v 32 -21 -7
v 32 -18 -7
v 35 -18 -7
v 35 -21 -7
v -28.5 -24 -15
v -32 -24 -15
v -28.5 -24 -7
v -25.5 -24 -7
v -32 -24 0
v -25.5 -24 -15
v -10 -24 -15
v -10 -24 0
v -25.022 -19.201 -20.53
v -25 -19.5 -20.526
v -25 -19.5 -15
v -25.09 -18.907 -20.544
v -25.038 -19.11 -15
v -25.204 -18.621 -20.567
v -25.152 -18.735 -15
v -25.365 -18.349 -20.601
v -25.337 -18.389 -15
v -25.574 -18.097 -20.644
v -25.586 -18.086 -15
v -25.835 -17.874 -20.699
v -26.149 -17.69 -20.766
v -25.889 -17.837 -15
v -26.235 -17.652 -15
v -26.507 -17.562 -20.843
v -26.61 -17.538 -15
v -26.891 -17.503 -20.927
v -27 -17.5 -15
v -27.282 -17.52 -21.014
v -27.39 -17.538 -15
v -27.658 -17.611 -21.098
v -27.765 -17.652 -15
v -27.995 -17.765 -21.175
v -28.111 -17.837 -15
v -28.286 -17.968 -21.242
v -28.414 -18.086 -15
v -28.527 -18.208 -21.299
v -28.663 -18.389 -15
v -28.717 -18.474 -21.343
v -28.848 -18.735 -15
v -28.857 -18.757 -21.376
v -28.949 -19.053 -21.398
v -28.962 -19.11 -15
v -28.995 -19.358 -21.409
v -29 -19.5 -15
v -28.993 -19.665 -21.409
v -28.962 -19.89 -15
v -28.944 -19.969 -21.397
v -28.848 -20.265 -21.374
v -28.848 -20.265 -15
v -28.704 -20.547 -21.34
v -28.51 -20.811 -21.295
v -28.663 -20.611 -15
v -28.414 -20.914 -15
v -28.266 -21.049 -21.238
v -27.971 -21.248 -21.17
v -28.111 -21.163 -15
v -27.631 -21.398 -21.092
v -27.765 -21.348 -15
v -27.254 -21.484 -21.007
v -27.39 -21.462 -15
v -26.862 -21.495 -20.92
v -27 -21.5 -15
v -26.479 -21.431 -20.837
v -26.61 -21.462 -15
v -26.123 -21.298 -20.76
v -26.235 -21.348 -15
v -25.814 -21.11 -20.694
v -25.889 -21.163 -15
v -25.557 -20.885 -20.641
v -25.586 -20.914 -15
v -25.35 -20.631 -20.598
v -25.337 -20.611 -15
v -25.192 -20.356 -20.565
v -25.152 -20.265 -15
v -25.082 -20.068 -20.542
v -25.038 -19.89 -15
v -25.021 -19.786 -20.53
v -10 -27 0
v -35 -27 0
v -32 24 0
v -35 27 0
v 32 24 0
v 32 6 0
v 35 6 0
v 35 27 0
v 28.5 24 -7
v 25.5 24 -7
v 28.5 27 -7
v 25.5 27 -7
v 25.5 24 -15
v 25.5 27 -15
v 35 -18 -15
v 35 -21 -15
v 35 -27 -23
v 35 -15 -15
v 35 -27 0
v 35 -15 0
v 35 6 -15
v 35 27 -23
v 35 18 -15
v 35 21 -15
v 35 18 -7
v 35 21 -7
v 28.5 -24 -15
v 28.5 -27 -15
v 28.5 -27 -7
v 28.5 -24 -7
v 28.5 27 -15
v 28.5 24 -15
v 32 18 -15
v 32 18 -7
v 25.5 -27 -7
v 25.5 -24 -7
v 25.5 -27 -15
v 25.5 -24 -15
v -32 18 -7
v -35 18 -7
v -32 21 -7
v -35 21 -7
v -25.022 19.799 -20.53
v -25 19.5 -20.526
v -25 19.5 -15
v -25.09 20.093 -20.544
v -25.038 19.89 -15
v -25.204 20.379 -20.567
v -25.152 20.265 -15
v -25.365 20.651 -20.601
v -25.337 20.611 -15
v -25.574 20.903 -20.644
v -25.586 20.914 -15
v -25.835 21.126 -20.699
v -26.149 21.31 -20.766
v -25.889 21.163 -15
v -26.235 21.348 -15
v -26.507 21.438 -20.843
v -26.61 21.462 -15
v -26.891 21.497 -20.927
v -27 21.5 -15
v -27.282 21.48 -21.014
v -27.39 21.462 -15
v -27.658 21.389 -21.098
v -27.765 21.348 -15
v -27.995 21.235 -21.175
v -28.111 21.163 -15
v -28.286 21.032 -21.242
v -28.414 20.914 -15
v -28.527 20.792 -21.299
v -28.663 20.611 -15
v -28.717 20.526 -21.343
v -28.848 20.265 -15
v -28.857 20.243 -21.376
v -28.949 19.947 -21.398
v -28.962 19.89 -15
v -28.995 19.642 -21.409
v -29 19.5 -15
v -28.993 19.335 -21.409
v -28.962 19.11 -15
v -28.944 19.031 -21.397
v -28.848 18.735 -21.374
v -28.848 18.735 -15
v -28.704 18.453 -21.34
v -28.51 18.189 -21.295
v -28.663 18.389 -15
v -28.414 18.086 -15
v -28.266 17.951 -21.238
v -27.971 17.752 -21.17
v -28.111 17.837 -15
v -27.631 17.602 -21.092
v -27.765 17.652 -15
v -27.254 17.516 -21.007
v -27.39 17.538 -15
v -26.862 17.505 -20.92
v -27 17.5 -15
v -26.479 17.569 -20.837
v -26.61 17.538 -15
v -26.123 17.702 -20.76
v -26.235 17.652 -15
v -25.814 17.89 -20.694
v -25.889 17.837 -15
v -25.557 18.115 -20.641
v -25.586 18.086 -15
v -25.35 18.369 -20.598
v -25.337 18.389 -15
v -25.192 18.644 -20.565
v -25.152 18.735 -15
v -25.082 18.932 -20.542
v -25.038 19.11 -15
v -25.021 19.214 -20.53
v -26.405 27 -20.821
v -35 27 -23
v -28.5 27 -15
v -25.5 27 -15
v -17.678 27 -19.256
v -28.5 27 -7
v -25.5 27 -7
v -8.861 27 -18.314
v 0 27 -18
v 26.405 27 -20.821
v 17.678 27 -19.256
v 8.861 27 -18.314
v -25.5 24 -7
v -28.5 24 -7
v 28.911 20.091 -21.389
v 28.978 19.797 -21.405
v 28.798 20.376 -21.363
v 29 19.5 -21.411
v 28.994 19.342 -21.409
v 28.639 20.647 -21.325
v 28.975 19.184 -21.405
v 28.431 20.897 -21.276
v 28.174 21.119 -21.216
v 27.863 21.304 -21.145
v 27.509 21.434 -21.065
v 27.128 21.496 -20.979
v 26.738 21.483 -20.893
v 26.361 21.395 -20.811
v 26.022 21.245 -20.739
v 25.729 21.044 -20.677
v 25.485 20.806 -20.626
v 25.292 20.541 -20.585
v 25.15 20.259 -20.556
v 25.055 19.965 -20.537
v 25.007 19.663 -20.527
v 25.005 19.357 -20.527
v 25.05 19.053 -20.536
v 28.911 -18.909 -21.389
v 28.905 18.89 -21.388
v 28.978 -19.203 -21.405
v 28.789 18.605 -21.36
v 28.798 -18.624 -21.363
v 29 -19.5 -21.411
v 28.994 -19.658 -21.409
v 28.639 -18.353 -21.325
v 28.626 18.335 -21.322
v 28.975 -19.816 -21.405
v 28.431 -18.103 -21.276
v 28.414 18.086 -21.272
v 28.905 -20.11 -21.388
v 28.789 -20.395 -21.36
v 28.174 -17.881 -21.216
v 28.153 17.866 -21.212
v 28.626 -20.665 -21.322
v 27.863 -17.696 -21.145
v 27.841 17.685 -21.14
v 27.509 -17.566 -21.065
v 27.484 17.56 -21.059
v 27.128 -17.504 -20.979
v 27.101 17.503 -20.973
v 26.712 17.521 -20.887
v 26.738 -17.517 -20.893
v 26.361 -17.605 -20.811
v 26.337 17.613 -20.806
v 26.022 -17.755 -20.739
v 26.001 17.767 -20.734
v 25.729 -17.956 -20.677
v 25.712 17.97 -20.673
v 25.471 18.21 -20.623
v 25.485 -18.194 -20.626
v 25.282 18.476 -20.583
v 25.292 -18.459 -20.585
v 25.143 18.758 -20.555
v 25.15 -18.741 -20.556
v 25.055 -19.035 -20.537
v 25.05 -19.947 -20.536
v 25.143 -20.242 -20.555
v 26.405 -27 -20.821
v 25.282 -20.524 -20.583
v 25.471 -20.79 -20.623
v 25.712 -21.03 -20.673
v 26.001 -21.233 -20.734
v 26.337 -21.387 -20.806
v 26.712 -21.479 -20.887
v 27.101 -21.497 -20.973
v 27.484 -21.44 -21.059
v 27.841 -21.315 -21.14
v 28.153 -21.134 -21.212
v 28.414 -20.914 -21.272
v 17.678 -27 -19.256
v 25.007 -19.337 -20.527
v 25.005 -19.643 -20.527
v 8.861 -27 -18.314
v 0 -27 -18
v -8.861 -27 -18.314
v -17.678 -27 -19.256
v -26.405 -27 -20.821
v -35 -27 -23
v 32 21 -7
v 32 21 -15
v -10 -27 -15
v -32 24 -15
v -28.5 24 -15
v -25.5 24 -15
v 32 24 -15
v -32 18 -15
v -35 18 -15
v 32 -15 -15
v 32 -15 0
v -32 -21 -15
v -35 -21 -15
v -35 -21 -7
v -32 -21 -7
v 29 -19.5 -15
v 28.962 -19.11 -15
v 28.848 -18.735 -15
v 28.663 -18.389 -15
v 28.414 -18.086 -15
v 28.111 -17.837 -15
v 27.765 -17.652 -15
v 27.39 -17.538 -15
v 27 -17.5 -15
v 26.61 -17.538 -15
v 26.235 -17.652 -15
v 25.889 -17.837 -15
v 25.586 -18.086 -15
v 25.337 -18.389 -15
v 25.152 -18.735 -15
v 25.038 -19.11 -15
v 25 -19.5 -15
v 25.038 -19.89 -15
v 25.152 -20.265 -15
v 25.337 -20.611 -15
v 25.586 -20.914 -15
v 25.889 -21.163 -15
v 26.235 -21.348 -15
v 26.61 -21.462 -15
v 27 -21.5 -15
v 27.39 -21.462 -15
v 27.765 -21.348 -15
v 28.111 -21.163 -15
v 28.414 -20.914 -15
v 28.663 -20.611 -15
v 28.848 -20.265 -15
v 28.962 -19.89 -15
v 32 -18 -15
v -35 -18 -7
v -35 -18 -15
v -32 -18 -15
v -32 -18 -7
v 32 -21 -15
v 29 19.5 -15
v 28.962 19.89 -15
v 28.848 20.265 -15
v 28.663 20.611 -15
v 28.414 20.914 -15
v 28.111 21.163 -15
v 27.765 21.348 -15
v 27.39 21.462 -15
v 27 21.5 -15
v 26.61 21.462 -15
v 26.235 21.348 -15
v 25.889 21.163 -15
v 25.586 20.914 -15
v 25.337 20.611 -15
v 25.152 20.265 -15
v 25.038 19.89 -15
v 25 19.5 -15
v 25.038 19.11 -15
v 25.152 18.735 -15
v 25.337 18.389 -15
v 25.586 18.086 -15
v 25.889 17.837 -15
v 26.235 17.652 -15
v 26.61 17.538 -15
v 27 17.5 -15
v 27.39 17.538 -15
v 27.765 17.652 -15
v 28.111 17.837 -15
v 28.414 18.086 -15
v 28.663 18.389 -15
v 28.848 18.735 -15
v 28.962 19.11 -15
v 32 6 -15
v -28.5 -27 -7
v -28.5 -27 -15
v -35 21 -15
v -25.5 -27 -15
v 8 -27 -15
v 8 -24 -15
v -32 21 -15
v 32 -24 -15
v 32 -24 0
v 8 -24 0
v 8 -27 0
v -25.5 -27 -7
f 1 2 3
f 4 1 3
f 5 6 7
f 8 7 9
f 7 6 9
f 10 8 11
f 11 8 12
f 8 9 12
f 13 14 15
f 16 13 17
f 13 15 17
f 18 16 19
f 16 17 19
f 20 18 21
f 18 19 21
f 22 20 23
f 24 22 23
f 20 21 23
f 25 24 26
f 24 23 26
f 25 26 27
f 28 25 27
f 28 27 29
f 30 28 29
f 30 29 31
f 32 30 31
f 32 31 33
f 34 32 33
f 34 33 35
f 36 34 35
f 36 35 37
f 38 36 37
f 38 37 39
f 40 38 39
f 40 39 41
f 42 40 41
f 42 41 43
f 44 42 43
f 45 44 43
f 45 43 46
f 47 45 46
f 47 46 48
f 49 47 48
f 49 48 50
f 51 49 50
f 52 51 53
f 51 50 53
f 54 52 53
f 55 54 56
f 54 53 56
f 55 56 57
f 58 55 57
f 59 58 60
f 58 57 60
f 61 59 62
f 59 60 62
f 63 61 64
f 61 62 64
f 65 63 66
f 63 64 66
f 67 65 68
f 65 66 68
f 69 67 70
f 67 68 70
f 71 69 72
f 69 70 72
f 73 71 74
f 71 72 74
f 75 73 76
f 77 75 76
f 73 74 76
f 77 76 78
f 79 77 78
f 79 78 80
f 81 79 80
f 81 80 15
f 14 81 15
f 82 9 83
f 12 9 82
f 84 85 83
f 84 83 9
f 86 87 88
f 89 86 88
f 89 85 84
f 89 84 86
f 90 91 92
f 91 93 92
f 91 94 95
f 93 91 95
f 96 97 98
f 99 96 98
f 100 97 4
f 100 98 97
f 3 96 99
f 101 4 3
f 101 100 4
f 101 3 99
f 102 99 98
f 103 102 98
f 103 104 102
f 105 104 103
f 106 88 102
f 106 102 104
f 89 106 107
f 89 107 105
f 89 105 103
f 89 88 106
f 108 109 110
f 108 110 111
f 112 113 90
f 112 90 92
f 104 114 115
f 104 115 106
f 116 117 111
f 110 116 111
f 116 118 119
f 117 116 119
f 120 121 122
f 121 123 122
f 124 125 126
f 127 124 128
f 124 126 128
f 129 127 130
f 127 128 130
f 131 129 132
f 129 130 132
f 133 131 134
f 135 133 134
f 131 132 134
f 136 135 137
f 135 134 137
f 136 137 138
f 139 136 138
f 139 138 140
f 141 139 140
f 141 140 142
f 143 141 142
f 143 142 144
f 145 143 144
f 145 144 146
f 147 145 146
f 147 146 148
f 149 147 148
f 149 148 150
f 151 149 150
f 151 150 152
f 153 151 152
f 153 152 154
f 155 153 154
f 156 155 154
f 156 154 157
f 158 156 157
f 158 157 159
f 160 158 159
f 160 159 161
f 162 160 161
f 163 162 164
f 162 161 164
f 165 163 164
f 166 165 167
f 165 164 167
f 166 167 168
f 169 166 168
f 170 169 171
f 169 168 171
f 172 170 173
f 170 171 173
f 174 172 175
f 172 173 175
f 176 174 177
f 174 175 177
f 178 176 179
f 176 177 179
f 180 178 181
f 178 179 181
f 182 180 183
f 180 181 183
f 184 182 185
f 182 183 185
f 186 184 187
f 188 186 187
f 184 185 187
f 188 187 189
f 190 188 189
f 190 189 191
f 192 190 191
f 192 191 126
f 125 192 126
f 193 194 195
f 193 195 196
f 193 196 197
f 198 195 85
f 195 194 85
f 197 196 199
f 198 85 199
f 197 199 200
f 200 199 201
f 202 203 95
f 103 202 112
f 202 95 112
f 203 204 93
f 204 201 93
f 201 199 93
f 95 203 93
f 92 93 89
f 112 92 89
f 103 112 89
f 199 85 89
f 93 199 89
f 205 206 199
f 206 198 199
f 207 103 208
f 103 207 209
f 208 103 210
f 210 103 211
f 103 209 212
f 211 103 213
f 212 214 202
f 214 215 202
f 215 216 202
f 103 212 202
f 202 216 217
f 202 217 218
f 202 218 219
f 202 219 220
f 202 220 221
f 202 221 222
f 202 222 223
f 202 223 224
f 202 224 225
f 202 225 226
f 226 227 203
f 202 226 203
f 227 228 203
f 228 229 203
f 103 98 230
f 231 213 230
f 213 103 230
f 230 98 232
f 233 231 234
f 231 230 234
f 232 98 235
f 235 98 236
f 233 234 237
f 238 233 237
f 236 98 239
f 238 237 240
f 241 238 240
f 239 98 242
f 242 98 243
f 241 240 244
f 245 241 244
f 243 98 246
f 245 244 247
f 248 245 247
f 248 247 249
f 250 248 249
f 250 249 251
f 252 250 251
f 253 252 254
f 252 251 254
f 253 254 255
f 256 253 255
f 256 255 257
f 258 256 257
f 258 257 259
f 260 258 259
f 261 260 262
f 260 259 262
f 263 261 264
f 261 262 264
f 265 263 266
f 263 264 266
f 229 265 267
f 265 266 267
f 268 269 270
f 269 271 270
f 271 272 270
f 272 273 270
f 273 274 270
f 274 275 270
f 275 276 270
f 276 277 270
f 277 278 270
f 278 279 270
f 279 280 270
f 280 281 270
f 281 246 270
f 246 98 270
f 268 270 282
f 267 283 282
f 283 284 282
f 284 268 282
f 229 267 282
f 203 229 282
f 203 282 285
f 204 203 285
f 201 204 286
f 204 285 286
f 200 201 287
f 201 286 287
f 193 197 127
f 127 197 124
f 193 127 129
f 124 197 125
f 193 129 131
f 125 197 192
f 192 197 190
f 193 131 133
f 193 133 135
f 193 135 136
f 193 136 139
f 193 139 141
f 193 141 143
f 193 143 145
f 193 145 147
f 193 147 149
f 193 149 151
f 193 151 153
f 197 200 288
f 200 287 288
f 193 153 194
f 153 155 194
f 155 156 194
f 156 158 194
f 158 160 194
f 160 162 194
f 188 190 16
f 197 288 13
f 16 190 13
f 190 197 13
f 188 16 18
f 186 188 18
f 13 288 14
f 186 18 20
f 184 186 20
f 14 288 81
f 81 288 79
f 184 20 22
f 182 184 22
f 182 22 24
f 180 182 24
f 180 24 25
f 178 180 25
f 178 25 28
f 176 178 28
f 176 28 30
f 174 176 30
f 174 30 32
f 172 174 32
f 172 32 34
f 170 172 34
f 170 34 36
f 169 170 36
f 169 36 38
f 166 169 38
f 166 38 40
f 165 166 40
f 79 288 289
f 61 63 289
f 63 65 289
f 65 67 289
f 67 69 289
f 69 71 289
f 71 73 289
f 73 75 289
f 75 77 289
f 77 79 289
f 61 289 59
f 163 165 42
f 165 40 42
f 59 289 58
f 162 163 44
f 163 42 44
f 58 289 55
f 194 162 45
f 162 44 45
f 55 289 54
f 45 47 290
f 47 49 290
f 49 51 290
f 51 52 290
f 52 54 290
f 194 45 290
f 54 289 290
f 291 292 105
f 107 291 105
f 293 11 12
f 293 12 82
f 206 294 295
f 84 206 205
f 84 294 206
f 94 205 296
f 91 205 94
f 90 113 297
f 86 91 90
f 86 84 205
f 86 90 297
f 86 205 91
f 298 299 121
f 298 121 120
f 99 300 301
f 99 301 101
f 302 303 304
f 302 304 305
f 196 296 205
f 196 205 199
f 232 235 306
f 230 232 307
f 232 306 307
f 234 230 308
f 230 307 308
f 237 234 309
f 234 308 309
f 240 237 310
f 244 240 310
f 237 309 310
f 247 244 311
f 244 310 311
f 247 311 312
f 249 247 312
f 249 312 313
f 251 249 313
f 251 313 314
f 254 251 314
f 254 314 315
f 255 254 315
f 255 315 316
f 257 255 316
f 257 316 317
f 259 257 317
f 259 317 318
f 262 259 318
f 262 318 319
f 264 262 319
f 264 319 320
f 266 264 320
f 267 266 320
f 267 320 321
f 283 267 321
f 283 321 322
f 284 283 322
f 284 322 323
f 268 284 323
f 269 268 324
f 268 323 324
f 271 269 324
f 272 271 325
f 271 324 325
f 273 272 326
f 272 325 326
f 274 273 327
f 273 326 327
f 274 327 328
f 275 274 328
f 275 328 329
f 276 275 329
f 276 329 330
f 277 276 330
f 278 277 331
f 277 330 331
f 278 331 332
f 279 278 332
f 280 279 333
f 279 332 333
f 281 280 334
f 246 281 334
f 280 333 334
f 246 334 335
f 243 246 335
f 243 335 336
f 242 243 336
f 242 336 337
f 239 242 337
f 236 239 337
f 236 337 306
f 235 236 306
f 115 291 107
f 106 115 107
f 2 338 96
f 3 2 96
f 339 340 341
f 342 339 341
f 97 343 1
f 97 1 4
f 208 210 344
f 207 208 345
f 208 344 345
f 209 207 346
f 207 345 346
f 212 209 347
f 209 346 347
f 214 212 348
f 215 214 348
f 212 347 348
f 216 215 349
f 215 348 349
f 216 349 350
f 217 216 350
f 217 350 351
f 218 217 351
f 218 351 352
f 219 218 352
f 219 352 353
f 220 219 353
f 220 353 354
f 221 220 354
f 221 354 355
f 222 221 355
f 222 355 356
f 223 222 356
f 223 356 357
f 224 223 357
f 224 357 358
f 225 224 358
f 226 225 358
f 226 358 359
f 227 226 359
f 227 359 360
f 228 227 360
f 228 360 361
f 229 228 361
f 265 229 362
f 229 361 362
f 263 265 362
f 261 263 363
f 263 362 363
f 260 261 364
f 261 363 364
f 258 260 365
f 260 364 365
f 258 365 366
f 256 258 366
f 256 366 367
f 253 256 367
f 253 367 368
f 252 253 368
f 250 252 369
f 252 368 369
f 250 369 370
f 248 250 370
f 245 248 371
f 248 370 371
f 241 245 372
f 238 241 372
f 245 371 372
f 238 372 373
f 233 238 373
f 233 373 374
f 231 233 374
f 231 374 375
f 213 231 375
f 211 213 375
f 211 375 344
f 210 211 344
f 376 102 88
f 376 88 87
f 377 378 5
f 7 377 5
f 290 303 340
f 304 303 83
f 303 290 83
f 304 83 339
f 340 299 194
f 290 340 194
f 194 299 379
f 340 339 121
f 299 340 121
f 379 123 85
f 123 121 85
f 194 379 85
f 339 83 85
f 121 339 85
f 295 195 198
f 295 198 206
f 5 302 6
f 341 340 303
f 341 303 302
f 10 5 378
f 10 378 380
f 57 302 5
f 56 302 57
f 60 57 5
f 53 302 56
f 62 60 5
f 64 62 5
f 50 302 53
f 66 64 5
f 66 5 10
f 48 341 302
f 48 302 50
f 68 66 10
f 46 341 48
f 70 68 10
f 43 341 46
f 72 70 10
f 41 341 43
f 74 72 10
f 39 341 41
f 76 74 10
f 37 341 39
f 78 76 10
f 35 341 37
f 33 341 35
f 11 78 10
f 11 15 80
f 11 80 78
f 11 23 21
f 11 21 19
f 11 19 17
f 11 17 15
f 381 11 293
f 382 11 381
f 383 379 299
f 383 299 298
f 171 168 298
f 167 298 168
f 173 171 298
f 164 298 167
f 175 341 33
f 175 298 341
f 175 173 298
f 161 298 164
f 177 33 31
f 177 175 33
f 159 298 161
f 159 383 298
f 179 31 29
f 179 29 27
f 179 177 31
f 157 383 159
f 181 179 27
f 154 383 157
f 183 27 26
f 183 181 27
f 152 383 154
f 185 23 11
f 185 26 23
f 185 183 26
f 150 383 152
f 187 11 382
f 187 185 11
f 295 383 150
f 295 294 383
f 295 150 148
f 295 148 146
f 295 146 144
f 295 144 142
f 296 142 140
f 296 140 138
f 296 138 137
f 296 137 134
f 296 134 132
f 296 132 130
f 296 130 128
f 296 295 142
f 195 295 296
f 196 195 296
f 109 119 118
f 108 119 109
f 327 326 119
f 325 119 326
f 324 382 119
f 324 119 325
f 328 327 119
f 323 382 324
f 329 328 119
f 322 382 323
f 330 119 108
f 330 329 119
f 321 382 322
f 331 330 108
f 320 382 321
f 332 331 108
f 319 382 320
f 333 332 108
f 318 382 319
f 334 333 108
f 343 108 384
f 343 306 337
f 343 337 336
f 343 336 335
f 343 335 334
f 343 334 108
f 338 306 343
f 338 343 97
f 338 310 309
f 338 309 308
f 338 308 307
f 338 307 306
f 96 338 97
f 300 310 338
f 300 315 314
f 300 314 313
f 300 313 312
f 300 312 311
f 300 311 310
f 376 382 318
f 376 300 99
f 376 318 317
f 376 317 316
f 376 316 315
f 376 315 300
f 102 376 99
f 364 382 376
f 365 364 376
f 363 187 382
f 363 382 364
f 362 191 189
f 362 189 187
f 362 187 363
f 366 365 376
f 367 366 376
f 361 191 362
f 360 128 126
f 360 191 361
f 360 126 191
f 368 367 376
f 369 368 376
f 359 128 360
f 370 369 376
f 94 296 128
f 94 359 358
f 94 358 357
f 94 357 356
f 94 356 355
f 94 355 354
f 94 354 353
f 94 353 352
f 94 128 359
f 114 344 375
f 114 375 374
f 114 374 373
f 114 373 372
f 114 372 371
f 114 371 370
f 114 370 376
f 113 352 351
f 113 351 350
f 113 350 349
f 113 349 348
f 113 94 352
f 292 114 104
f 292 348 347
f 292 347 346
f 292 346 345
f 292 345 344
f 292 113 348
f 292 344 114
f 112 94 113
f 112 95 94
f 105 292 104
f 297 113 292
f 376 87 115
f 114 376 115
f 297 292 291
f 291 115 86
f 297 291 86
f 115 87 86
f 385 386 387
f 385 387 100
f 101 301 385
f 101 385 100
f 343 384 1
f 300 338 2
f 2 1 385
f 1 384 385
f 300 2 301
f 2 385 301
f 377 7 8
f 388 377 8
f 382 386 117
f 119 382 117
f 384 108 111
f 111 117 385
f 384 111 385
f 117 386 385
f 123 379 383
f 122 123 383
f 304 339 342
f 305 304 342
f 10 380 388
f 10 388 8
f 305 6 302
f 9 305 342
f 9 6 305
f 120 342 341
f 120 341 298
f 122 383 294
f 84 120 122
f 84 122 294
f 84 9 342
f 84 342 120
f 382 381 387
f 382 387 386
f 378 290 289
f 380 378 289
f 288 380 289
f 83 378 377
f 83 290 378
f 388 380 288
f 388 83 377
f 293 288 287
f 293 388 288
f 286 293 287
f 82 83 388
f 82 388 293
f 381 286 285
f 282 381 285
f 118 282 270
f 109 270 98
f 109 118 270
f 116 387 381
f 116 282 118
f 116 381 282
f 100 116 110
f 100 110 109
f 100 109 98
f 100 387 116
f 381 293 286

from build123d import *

# Parameters (mm, degrees)
F0_W      = 70
F0_H      = 54
F1_DEPTH  = 23
F3_DEPTH  = 60
F4_W      = 64
F4_H      = 48
F5_DEPTH  = 15
F6_R      = 2
F7_DEPTH  = 25
F9_DEPTH  = 25
F11_DEPTH = 25
F12_W     = 1.5
F12_H     = 36
F12_W_2   = 13.280427
F12_H_2   = 3
F12_W_3   = 51
F12_W_4   = 12.749882
F12_W_5   = 3
F12_H_3   = 49.144776
F12_H_4   = 1.5
F12_H_5   = 10.144776
F12_W_6   = 67.280427
F12_W_7   = 66.749882
F13_DEPTH = 8


with BuildPart() as f1:
    # F0 (on Top) → F1 (new body)
    with BuildSketch(Plane.XY):
        Rectangle(F0_W, F0_H)
    extrude(amount=-F1_DEPTH)

    # F2 (on face) → F3 (cut)
    with BuildSketch(Plane.XZ.offset(27)):
        with BuildLine():
            Line((-35, -23), (35, -23))
            ThreePointArc((35, -23), (0, -18), (-35, -23))
        make_face()
    extrude(amount=-F3_DEPTH, mode=Mode.SUBTRACT)

    # F4 (on face) → F5 (cut)
    with BuildSketch(Plane.XY):
        Rectangle(F4_W, F4_H)
    extrude(amount=-F5_DEPTH, mode=Mode.SUBTRACT)

    # F6 (on face) → F7 (cut)
    with BuildSketch(Plane.XY.offset(-15)):
        with Locations((-27, 19.5)):
            Circle(F6_R)
        with Locations((-27, -19.5)):
            Circle(F6_R)
        with Locations((27, -19.5)):
            Circle(F6_R)
        with Locations((27, 19.5)):
            Circle(F6_R)
    extrude(amount=-F7_DEPTH, mode=Mode.SUBTRACT)

    # F8 (on face) → F9 (cut)
    with BuildSketch(Plane.XY.offset(-15)):
        Polygon((37, 6), (32, 6), (32, -15), (38.883269, -15), (38.883269, 6), align=None)
    extrude(amount=F9_DEPTH, mode=Mode.SUBTRACT)

    # F10 (on face) → F11 (cut)
    with BuildSketch(Plane.XY.offset(-15)):
        Polygon((8, -24), (-10, -24), (-10, -27.841958), (-10, -32.821599), (8, -32.821599), align=None)
    extrude(amount=F11_DEPTH, mode=Mode.SUBTRACT)

    # F12 (on face) → F13 (cut)
    with BuildSketch(Plane.XY.offset(-15)):
        with Locations((27.75, 0)):
            Rectangle(F12_W, F12_H)
        Polygon((25.5, 18), (27, 18), (28.5, 18), (28.5, 21), (25.5, 21), align=None)
        with Locations((35.140214, 19.5)):
            Rectangle(F12_W_2, F12_H_2)
        with Locations((0, 19.5)):
            Rectangle(F12_W_3, F12_H_2)
        with Locations((34.874941, -19.5)):
            Rectangle(F12_W_4, F12_H_2)
        with Locations((27, 45.572388)):
            Rectangle(F12_W_5, F12_H_3)
        Polygon((-27, 18), (-25.5, 18), (-25.5, 21), (-28.5, 21), (-28.5, 18), align=None)
        with Locations((0, -20.25)):
            Rectangle(F12_W_3, F12_H_4)
        with Locations((27, -26.072388)):
            Rectangle(F12_W_5, F12_H_5)
        with Locations((-27, 45.572388)):
            Rectangle(F12_W_5, F12_H_3)
        with Locations((-27.75, 0)):
            Rectangle(F12_W, F12_H)
        with Locations((-62.140213, 19.5)):
            Rectangle(F12_W_6, F12_H_2)
        with Locations((-27, -26.072388)):
            Rectangle(F12_W_5, F12_H_5)
        with Locations((-61.874941, -19.5)):
            Rectangle(F12_W_7, F12_H_2)
    extrude(amount=F13_DEPTH, mode=Mode.SUBTRACT)


solid = f1.part
